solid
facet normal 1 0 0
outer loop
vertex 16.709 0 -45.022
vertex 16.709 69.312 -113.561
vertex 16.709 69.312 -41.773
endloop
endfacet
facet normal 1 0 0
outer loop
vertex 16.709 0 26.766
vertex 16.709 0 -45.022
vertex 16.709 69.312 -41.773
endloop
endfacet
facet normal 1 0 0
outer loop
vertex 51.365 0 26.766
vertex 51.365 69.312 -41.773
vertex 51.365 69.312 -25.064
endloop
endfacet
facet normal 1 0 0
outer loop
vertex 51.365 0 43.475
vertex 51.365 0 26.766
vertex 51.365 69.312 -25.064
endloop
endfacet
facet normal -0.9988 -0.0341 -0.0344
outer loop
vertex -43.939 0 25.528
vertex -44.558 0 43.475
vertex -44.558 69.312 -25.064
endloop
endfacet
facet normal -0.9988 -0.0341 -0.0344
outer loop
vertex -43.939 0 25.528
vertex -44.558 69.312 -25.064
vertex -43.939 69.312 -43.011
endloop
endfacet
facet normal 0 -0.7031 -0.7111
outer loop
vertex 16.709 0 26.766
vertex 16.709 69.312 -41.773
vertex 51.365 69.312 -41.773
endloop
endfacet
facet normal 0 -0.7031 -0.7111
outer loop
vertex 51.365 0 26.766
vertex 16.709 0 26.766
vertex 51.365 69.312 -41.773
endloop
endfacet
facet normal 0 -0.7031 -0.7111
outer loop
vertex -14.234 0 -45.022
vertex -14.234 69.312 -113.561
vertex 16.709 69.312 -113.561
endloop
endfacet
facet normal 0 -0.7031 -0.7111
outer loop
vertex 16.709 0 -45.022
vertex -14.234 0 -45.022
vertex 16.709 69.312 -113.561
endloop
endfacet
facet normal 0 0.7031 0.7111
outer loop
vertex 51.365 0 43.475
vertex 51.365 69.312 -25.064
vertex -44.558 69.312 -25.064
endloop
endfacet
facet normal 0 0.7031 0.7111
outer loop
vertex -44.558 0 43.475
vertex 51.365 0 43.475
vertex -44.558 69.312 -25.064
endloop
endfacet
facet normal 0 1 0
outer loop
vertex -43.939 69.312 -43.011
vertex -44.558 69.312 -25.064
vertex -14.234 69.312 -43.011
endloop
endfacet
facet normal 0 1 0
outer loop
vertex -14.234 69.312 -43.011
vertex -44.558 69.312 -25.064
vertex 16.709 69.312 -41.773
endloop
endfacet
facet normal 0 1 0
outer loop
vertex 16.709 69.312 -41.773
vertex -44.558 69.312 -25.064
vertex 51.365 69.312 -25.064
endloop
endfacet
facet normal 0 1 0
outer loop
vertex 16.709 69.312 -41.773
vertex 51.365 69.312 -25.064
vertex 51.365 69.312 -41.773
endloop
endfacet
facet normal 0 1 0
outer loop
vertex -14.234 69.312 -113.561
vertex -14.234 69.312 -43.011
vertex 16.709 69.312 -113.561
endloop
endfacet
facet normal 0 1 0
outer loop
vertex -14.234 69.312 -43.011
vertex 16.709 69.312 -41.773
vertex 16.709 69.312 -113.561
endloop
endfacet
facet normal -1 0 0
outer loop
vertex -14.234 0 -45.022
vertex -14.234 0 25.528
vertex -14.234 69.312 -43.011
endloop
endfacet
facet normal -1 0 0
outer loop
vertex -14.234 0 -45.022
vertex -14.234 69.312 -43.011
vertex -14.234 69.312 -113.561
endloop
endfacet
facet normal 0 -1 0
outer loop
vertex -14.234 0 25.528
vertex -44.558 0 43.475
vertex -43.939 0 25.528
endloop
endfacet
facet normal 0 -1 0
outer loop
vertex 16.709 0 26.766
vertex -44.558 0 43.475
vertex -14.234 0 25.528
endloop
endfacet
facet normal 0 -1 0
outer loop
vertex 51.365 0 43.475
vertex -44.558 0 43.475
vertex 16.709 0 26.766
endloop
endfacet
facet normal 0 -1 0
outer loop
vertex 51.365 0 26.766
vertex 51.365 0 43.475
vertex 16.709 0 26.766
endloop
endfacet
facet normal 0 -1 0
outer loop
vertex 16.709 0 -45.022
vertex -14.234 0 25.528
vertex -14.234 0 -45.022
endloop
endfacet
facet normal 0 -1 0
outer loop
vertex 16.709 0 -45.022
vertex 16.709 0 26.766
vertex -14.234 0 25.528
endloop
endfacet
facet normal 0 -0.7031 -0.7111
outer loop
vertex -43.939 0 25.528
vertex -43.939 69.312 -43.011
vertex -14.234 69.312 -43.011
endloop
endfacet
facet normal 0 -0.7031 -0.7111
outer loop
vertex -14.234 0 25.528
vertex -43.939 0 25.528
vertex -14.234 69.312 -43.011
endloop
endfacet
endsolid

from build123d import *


with BuildPart() as f2:
    # F2: sweep along a path in F1
    with BuildLine(Plane.YZ) as f2_path:
        Line((0, 0), (69.312386, -68.5388))
    # F0 (on Front) → F2 (sweep)
    with BuildSketch(Plane.XZ):
        Polygon((51.365424, 43.474954), (-44.557959, 43.474954), (-43.939099, 25.527997), (-14.233792, 25.527997), (-14.233792, -45.022104), (16.709233, -45.022104), (16.709233, 26.765719), (51.365424, 26.765719), align=None)
    sweep(path=f2_path.line)


solid = f2.part
